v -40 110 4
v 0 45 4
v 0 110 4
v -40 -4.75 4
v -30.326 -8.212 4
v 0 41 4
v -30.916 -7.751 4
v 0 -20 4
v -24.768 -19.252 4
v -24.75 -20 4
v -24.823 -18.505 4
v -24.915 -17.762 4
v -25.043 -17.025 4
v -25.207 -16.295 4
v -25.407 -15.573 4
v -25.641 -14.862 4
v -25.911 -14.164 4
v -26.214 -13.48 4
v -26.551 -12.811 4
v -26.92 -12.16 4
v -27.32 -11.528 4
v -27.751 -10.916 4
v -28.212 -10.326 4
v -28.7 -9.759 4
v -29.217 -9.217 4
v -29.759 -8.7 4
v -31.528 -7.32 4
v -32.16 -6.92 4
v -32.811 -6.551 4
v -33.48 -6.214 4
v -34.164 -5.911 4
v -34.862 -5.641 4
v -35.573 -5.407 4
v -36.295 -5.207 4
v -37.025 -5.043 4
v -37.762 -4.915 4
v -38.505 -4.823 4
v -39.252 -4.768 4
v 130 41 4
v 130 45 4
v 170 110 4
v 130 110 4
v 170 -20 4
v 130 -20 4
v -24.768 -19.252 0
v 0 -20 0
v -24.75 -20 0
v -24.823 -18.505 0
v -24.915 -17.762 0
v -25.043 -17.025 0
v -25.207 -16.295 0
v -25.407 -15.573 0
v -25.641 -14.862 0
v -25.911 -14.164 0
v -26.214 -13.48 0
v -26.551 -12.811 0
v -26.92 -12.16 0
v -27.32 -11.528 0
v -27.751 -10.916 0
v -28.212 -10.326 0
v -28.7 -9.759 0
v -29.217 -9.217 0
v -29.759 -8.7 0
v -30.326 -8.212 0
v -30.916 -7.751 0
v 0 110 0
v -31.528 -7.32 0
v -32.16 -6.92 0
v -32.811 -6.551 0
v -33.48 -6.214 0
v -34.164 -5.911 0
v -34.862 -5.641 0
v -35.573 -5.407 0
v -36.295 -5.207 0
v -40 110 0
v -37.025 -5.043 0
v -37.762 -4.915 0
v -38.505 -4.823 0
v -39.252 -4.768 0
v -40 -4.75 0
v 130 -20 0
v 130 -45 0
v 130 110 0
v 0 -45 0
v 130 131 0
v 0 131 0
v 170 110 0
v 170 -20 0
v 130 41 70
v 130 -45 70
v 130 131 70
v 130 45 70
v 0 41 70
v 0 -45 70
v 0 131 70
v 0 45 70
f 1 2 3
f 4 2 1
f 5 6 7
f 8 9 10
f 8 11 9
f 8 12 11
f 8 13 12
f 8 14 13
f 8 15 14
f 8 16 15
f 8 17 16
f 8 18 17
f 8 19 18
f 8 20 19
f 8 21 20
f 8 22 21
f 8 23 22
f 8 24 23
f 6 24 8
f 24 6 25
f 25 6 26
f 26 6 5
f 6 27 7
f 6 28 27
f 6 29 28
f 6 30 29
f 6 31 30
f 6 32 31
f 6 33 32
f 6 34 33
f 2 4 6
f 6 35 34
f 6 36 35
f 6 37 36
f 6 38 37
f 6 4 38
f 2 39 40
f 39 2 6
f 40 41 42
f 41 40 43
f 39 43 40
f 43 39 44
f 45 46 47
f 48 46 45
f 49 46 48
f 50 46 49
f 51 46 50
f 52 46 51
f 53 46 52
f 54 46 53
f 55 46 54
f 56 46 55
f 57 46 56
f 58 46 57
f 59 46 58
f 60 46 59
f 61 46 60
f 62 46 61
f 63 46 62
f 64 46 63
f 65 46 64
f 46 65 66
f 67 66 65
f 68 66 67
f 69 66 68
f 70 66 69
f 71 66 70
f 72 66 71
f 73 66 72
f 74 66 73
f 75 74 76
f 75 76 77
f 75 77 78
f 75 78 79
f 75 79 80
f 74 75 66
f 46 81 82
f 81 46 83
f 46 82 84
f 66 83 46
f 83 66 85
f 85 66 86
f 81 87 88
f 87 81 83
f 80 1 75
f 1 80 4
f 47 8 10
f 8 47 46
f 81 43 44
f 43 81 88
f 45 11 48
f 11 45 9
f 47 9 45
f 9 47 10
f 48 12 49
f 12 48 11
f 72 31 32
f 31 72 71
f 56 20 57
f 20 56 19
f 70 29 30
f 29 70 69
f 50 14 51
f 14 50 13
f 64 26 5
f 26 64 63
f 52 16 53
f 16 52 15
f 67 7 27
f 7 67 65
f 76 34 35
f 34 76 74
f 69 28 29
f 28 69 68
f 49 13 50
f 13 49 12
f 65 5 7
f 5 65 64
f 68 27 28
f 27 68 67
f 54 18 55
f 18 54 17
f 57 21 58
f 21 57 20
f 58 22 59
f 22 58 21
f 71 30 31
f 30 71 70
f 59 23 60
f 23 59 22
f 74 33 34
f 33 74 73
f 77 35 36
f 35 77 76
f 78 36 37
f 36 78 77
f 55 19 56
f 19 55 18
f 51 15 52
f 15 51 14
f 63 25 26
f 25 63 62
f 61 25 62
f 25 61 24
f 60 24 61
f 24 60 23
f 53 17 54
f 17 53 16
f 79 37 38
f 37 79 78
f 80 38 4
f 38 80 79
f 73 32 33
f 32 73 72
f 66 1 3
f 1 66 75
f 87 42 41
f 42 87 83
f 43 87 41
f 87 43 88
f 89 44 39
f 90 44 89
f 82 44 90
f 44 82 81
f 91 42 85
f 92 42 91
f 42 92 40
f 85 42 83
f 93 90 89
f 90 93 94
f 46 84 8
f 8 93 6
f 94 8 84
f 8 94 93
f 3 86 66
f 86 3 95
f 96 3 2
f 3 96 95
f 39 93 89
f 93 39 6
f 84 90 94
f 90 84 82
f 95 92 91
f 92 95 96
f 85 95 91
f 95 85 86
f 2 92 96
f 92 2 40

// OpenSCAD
// Rack for six 50 mL conical (Falcon-type) tubes
// Print orientation: Upside down. Flat plate on bed (Z=0).
// After printing, flip over to stand on the two walls.

// --- Dimensions ---
// Plate dimensions
W_PLATE_X = 130; // mm
W_PLATE_Y = 90;  // mm
H_PLATE = 4;     // mm

// Hole specifications
N_ROWS = 3;      // Rows along X
N_COLS = 2;      // Cols along Y
D_HOLE = 30.5;   // mm (Diameter)
C_X = 40;        // mm (Centre-to-centre spacing X)
C_Y = 40;        // mm (Centre-to-centre spacing Y)

// Wall specifications
H_WALL = 70;     // mm (Total height from bed)
W_WALL_THICK = 4; // mm (Thickness of wall)

// --- Derived Positions ---
// Plate is centred on origin
X_OFFSET = (W_PLATE_X / 2) - (W_PLATE_X / 2); // 0
Y_OFFSET = (W_PLATE_Y / 2) - (W_PLATE_Y / 2); // 0

// Hole grid positions
// Rows along X: 3 holes. Spacing 40mm.
// Centres at: -40, 0, +40
HOLE_X_POS = [-40, 0, 40];

// Cols along Y: 2 holes. Spacing 40mm.
// Plate Y is 90mm. Centres should be symmetric.
// If spacing is 40, and we have 2 holes, distance between them is 40.
// We need to fit this within 90mm plate width symmetrically.
// Let's calculate exact Y positions for 2 holes with 40mm spacing centered on Y=0.
// y1 = -20, y2 = +20. Distance = 40.
// Check clearance: 20 + 20 = 40 < 45 (half plate width). OK.
HOLE_Y_POS = [-20, 20];

// Wall positions
// Walls run along the long edges (X direction).
// Plate Y is 90mm. Half is 45mm.
// Wall thickness is 4mm.
// Wall 1 (Left): Extends from Y = -45 to Y = -41
// Wall 2 (Right): Extends from Y = +41 to Y = +45
WALL_Y_MIN = -45;
WALL_Y_MAX = 45;
WALL_Y_INNER = -41;
WALL_Y_OUTER = 41;

// --- Configuration ---
$fn = 128; // High resolution for holes and walls

module plate() {
    translate([0, 0, 0]) {
        cube([W_PLATE_X, W_PLATE_Y, H_PLATE], center = false);
    }
}

module hole(x, y) {
    translate([x, y, 0]) {
        // Cut a cylinder through the plate
        difference() {
            cube([W_PLATE_X, W_PLATE_Y, H_PLATE], center = false);
            cylinder(h = H_PLATE + 1, d = D_HOLE, $fn = 128);
        }
    }
}

module wall() {
    // Wall runs along X, from Y = -45 to -41 (Left) and +41 to +45 (Right)
    // We create two separate wall blocks to ensure clean geometry
    // Left Wall
    translate([0, WALL_Y_MIN, 0]) {
        cube([W_PLATE_X, WALL_Y_OUTER - WALL_Y_MIN, H_WALL], center = false);
    }
    // Right Wall
    translate([0, WALL_Y_MAX, 0]) {
        cube([W_PLATE_X, WALL_Y_MAX - WALL_Y_INNER, H_WALL], center = false);
    }
}

module main() {
    union() {
        // 1. Create the base plate
        plate();
        
        // 2. Create the holes
        for (xi = [0:N_ROWS-1]) {
            for (yi = [0:N_COLS-1]) {
                hole(
                    HOLE_X_POS[xi], 
                    HOLE_Y_POS[yi]
                );
            }
        }
        
        // 3. Create the walls
        // Since we used difference() for holes, the walls need to be added back
        // or we can build the whole thing as a union of (Plate + Holes) + Walls.
        // However, the holes cut through the plate. The walls are attached to the plate edges.
        // The holes do NOT intersect the walls because the walls are at Y=+-45 and holes are at Y=+-20.
        // So we can simply union the walls on top of the holed plate.
        
        wall();
    }
}

main();
